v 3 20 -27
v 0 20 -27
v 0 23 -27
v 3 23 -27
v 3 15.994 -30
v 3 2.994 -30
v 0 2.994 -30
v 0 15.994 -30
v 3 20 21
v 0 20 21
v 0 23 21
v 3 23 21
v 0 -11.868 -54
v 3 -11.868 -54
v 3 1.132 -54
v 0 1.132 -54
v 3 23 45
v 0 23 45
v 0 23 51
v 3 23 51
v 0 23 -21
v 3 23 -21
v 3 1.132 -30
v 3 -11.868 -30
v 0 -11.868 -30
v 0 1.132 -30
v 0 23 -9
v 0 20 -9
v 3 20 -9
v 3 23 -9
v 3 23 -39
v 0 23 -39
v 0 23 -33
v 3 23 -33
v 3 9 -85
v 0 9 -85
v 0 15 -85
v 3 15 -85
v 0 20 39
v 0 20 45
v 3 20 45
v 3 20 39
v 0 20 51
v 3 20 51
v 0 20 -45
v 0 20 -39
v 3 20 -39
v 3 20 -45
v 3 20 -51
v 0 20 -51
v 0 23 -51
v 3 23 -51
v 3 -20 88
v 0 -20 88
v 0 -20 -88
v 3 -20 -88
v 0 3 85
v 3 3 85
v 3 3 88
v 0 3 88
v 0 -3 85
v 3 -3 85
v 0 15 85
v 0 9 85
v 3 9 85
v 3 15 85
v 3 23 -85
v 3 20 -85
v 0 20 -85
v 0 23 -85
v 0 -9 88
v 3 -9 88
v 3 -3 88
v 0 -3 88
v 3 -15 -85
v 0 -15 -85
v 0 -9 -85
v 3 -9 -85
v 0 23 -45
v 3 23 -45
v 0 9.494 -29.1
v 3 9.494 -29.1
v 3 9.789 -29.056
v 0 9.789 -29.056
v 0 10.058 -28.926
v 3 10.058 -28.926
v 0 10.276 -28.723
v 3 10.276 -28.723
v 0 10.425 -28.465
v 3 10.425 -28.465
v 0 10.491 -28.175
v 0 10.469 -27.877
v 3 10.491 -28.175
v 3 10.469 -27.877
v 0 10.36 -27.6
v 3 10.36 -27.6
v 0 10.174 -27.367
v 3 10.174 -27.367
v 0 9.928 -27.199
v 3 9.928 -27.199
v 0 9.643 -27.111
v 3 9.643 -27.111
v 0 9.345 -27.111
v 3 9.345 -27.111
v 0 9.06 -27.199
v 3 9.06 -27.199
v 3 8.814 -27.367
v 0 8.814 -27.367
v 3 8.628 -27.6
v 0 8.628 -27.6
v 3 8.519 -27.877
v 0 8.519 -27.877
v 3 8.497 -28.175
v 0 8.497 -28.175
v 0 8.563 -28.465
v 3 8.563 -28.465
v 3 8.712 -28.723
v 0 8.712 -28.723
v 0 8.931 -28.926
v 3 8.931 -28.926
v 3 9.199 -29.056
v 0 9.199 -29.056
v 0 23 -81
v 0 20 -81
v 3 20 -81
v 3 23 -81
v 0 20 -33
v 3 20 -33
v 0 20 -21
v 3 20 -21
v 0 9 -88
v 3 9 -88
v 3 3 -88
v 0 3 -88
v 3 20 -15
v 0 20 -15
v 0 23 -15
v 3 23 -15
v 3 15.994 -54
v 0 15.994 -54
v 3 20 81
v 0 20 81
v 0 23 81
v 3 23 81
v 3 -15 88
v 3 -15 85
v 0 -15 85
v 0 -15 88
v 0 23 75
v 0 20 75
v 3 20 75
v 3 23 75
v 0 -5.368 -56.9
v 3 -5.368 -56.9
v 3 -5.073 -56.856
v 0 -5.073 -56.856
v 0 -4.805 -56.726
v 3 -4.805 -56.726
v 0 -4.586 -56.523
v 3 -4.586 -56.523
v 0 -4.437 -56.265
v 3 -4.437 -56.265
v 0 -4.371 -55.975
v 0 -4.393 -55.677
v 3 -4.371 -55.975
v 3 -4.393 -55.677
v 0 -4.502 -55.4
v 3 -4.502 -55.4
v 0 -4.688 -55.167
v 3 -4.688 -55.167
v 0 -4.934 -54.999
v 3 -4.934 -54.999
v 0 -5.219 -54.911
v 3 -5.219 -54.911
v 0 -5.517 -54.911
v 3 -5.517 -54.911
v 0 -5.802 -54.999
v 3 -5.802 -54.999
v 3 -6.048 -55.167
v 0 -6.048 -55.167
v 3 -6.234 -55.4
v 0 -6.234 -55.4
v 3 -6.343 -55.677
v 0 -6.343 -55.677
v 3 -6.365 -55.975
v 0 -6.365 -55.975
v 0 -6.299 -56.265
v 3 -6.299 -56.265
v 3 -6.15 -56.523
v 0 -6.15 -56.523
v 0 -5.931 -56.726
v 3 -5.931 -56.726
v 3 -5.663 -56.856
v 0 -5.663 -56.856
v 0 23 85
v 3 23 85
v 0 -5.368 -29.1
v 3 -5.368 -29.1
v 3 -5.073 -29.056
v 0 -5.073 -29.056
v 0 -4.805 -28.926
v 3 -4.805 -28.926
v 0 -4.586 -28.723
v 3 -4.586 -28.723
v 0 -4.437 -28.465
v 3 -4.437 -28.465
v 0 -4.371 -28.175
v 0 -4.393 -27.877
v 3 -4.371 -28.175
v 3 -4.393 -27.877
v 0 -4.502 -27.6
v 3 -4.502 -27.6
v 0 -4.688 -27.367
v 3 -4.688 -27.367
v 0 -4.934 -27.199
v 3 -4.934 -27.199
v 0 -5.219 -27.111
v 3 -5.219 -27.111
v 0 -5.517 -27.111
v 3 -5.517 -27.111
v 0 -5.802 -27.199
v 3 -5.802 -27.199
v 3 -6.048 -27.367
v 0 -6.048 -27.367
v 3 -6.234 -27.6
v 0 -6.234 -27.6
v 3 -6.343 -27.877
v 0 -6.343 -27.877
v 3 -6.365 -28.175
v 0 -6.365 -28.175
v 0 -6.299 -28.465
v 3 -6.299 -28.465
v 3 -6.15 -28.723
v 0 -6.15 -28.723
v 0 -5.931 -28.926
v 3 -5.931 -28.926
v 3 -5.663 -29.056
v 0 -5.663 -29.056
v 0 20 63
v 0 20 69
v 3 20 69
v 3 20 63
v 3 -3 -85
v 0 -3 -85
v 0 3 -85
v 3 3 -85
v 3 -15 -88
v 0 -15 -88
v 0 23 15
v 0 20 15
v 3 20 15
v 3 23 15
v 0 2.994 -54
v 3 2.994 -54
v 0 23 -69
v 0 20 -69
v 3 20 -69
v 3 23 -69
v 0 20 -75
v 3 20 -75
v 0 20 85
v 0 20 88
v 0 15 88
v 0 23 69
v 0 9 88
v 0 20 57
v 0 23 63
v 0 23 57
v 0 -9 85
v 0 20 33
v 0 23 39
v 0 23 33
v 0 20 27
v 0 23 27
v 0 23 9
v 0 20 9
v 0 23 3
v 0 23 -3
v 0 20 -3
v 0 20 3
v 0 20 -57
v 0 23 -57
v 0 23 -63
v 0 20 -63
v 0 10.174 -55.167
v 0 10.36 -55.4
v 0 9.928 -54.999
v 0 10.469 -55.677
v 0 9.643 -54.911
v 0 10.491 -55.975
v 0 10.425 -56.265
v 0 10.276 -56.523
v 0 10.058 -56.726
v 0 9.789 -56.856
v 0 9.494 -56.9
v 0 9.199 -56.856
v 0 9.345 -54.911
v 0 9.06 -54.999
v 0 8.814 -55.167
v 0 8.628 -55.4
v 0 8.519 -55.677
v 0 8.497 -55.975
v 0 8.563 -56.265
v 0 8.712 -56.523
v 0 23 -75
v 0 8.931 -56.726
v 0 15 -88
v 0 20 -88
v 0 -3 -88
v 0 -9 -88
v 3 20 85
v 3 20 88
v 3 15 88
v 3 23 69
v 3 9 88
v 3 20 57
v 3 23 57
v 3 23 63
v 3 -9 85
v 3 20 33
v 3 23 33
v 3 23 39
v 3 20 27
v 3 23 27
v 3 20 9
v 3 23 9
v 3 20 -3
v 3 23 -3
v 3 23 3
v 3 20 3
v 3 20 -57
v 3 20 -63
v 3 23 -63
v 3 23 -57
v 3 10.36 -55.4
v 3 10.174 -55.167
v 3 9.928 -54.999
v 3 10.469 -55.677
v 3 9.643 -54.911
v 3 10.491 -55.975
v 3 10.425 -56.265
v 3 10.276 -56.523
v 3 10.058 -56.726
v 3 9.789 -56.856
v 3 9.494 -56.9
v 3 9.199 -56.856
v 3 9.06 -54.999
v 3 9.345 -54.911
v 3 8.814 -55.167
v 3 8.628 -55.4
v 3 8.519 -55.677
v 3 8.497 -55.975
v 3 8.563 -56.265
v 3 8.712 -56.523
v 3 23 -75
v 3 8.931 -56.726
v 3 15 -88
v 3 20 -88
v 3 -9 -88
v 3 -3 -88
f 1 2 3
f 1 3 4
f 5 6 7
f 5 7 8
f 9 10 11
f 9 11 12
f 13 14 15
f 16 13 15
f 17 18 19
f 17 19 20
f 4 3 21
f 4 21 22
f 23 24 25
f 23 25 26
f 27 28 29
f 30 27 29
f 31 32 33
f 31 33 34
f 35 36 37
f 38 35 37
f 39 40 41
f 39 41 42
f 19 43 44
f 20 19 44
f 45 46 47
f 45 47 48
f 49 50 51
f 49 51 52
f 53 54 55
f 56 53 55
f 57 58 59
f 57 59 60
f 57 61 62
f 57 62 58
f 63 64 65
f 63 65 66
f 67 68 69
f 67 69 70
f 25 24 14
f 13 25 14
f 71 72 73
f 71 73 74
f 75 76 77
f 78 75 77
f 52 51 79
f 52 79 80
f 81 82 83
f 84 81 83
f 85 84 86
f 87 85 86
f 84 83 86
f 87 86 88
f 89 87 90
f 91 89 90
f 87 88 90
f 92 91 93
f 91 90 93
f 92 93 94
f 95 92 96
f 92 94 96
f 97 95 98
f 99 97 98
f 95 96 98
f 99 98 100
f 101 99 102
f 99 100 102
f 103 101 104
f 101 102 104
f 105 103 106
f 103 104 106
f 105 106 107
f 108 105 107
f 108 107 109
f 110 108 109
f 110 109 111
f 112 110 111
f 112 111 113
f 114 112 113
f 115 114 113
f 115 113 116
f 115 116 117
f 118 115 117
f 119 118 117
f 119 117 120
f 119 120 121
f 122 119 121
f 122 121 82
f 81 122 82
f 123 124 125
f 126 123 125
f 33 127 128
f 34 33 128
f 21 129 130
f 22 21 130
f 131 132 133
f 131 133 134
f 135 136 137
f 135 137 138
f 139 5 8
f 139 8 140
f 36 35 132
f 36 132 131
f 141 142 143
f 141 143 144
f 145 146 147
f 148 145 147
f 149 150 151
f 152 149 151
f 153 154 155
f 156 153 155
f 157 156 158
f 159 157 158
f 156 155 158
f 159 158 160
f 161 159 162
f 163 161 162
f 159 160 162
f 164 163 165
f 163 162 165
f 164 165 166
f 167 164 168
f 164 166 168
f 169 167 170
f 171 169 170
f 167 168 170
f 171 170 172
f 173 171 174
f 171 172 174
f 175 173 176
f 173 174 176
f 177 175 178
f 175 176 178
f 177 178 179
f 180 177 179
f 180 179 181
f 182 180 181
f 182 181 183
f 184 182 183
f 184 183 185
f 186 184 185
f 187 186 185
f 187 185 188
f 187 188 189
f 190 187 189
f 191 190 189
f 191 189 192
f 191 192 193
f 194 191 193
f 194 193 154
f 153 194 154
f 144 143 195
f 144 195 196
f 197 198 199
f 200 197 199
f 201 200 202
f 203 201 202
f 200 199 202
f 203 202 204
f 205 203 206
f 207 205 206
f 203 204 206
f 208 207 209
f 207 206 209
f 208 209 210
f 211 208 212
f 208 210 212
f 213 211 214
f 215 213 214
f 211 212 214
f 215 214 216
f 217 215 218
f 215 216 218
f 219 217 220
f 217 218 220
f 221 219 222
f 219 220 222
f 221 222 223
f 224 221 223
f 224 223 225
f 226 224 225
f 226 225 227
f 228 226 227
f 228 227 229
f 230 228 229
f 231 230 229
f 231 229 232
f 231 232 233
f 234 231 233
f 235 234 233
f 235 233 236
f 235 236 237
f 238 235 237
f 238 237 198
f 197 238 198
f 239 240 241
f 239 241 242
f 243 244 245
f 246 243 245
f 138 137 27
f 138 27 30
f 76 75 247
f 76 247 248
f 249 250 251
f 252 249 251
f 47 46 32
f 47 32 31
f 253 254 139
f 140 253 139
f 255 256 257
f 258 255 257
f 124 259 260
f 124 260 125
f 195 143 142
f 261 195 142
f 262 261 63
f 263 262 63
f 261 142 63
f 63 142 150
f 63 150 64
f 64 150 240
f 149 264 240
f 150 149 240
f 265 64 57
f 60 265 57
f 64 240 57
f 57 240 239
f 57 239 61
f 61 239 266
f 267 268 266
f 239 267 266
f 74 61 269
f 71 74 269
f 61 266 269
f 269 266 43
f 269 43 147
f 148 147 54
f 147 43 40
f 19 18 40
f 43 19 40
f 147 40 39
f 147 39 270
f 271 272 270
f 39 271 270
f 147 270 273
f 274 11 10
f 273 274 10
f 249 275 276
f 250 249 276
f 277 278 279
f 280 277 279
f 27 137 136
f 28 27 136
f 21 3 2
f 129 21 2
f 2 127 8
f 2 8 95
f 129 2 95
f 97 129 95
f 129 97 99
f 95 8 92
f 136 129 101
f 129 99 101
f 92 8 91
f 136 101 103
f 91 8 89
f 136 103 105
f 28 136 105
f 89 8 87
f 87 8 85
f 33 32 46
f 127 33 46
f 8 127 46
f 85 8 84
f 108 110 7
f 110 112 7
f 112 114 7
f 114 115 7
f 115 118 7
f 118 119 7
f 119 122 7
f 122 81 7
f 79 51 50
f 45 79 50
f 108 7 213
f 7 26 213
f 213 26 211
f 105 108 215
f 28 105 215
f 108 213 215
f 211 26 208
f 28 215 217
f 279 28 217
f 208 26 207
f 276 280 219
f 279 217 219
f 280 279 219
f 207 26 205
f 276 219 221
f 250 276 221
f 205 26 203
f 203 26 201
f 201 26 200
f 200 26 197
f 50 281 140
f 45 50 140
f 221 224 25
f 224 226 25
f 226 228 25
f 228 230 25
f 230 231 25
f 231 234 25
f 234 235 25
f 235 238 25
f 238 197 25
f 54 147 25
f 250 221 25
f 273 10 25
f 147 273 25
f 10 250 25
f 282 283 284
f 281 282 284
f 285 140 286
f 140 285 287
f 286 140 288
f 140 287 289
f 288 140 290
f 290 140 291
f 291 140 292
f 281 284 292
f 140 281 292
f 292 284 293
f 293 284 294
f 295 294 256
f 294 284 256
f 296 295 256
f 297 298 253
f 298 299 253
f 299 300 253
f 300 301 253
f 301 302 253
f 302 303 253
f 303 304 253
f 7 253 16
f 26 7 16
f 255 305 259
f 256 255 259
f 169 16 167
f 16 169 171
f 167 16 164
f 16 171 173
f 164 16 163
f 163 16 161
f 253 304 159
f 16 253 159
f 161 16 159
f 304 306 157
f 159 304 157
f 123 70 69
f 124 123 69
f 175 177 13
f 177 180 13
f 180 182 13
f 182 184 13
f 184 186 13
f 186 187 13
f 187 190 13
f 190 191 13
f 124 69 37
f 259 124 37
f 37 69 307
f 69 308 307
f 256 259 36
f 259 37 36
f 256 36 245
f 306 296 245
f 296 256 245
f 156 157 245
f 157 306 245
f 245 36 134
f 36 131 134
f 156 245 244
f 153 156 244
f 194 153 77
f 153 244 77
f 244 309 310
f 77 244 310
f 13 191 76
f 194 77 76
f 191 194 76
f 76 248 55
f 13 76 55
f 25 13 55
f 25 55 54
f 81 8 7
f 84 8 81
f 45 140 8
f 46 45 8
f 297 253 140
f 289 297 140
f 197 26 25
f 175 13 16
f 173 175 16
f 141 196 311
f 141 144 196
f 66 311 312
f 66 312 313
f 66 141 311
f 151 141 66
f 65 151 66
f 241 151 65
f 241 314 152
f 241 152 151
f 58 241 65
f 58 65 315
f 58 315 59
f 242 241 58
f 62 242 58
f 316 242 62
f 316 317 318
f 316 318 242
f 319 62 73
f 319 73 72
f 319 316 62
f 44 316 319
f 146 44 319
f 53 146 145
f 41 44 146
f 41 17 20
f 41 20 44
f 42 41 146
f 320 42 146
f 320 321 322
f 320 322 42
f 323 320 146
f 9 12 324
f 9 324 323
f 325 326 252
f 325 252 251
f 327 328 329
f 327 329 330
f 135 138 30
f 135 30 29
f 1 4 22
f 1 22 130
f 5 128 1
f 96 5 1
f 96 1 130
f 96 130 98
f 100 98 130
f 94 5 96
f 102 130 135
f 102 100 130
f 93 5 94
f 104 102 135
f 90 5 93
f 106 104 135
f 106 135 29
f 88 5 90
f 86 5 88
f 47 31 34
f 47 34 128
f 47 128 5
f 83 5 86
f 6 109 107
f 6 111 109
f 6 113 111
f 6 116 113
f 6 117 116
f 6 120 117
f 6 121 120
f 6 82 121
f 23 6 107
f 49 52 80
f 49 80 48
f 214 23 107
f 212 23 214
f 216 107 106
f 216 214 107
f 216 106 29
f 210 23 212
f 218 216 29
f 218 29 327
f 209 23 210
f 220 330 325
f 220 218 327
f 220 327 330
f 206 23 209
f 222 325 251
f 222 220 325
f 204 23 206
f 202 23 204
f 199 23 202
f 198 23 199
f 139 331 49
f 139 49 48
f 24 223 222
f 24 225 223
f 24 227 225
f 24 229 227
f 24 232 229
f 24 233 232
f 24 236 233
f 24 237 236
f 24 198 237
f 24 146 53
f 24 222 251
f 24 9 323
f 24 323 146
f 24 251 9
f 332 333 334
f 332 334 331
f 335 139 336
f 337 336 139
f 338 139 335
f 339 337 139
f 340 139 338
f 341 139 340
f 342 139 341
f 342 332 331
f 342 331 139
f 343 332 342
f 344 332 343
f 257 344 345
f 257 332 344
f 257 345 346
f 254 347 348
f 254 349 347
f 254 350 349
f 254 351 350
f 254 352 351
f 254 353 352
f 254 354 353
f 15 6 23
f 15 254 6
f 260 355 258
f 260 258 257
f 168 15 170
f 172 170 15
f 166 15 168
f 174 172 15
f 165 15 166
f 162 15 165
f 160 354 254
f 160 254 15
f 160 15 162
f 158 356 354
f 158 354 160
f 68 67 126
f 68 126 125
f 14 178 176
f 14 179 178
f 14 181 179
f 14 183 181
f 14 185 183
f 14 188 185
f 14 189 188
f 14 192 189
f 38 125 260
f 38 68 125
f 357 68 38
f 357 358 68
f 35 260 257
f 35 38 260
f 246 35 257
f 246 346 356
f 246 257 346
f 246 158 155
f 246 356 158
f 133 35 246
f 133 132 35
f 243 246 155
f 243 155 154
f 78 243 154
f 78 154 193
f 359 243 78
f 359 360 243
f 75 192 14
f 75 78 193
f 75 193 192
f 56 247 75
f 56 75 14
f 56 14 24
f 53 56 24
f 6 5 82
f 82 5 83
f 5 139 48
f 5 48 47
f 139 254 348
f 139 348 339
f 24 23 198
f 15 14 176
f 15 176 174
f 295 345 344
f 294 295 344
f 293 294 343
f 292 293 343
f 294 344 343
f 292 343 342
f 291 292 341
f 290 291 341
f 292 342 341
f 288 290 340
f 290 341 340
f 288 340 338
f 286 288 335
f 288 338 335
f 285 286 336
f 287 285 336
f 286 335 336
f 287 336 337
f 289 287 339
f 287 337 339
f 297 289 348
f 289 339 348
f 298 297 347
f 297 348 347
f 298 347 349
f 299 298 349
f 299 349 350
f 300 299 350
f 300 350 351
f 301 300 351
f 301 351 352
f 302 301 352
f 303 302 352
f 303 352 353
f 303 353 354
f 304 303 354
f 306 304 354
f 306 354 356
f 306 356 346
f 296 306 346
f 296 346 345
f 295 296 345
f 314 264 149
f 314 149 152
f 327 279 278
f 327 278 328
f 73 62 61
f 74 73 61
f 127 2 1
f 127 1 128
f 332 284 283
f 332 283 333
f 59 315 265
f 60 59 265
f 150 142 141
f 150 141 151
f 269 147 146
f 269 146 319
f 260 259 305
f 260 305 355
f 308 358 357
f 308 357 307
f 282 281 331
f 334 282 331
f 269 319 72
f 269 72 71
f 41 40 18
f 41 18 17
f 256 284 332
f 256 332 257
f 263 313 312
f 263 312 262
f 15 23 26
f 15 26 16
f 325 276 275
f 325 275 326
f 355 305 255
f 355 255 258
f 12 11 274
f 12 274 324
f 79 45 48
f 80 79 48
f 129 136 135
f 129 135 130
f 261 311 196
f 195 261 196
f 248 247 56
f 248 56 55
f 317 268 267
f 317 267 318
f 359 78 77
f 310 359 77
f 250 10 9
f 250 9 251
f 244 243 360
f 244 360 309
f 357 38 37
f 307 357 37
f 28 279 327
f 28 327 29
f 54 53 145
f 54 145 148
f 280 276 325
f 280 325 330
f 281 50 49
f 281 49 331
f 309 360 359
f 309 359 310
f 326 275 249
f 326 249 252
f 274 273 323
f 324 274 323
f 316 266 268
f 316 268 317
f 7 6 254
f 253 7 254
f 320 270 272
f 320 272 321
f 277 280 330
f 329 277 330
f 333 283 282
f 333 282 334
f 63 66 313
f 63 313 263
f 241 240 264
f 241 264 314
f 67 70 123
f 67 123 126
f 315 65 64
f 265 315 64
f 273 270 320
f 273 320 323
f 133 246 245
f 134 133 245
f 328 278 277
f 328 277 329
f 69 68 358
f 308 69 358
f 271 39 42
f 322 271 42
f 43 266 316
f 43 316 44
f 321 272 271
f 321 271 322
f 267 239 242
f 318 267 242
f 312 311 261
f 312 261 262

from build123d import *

# Parameters (mm, degrees)
SKETCH1_W               = 170
SKETCH1_H               = 40
BOSS_EXTRUDE1_DEPTH     = 3
SKETCH3_W               = 3
SKETCH3_H               = 6
BOSS_EXTRUDE2_DEPTH     = 3
LPATTERN1_COUNT         = 3
LPATTERN1_PITCH         = 12
LPATTERN1_COL_COUNT     = 2
LPATTERN1_COL_PITCH     = 12
SKETCH4_W               = 3
SKETCH4_H               = 6
BOSS_EXTRUDE3_DEPTH     = 3
LPATTERN2_COUNT         = 8
LPATTERN2_PITCH         = 12
LPATTERN2_COL_COUNT     = 8
LPATTERN2_COL_PITCH     = 12
MIRROR1_COPY_1_SKETCH_W = 3
MIRROR1_COPY_1_SKETCH_H = 6
MIRROR1_COPY_1_DEPTH    = 3
MIRROR1_COPY_2_SKETCH_W = 3
MIRROR1_COPY_2_SKETCH_H = 6
MIRROR1_COPY_2_DEPTH    = 3
MIRROR1_COPY_3_SKETCH_W = 3
MIRROR1_COPY_3_SKETCH_H = 6
MIRROR1_COPY_3_DEPTH    = 3
SKETCH6_R               = 1
SKETCH6_W               = 24
SKETCH6_H               = 13
CUT_EXTRUDE2_DEPTH      = 4
SKETCH7_W               = 3
SKETCH7_H               = 3
CUT_EXTRUDE4_DEPTH      = 4
SKETCH8_W               = 3
SKETCH8_H               = 1
CUT_EXTRUDE5_DEPTH      = 3


with BuildPart() as part:
    # Sketch1 → Boss-Extrude1 (new body)
    with BuildSketch(Plane(origin=(0, 0, 0), x_dir=(0, 0, -1), z_dir=(1, 0, 0))):
        Rectangle(SKETCH1_W, SKETCH1_H)
    extrude(amount=BOSS_EXTRUDE1_DEPTH)

    # Sketch3 → Boss-Extrude2 (add)
    with BuildSketch(Plane(origin=(0, 0, -85), x_dir=(-1, 0, 0), z_dir=(0, 0, -1))):
        with Locations((-1.5, 6)):
            Rectangle(SKETCH3_W, SKETCH3_H)
    boss_extrude2 = extrude(amount=BOSS_EXTRUDE2_DEPTH)

    # LPattern1: Boss-Extrude2 ×3
    with Locations(*[(0, -i * LPATTERN1_PITCH, 0) for i in range(1, LPATTERN1_COUNT)]):
        add(boss_extrude2)

    # LPattern1 col: Boss-Extrude2 ×2
    with Locations(*[(0, i * LPATTERN1_COL_PITCH, 0) for i in range(1, LPATTERN1_COL_COUNT)]):
        add(boss_extrude2)

    # Sketch4 → Boss-Extrude3 (add)
    with BuildSketch(Plane(origin=(0, 20, 0), x_dir=(1, 0, 0), z_dir=(0, 1, 0))):
        with Locations((1.5, 0)):
            Rectangle(SKETCH4_W, SKETCH4_H)
    boss_extrude3 = extrude(amount=BOSS_EXTRUDE3_DEPTH)

    # LPattern2: Boss-Extrude3 ×8
    with Locations(*[(0, 0, -i * LPATTERN2_PITCH) for i in range(1, LPATTERN2_COUNT)]):
        add(boss_extrude3)

    # LPattern2 col: Boss-Extrude3 ×8
    with Locations(*[(0, 0, i * LPATTERN2_COL_PITCH) for i in range(1, LPATTERN2_COL_COUNT)]):
        add(boss_extrude3)

    # Mirror1: Boss-Extrude2 across plane
    add(boss_extrude2.mirror(Plane.XY))

    # Mirror1 copy 1 sketch → Mirror1 copy 1 (add)
    with BuildSketch(Plane(origin=(0, -12, 85), x_dir=(-1, 0, 0), z_dir=(0, 0, 1))):
        with Locations((-1.5, -6)):
            Rectangle(MIRROR1_COPY_1_SKETCH_W, MIRROR1_COPY_1_SKETCH_H)
    extrude(amount=MIRROR1_COPY_1_DEPTH)

    # Mirror1 copy 2 sketch → Mirror1 copy 2 (add)
    with BuildSketch(Plane(origin=(0, -24, 85), x_dir=(-1, 0, 0), z_dir=(0, 0, 1))):
        with Locations((-1.5, -6)):
            Rectangle(MIRROR1_COPY_2_SKETCH_W, MIRROR1_COPY_2_SKETCH_H)
    extrude(amount=MIRROR1_COPY_2_DEPTH)

    # Mirror1 copy 3 sketch → Mirror1 copy 3 (add)
    with BuildSketch(Plane(origin=(0, 12, 85), x_dir=(-1, 0, 0), z_dir=(0, 0, 1))):
        with Locations((-1.5, -6)):
            Rectangle(MIRROR1_COPY_3_SKETCH_W, MIRROR1_COPY_3_SKETCH_H)
    extrude(amount=MIRROR1_COPY_3_DEPTH)

    # Sketch6 → Cut-Extrude2 (cut, through all)
    with BuildSketch(Plane(origin=(3, 0, 0), x_dir=(0, 0, -1), z_dir=(1, 0, 0))):
        with Locations((28.1, -5.368175576)):
            Circle(SKETCH6_R)
        with Locations((55.9, -5.368175576)):
            Circle(SKETCH6_R)
        with Locations((28.1, 9.494198583)):
            Circle(SKETCH6_R)
        with Locations((55.9, 9.494198583)):
            Circle(SKETCH6_R)
        with Locations((42, -5.368175576)):
            Rectangle(SKETCH6_W, SKETCH6_H)
        with Locations((42, 9.494198583)):
            Rectangle(SKETCH6_W, SKETCH6_H)
    extrude(amount=-CUT_EXTRUDE2_DEPTH, mode=Mode.SUBTRACT)

    # Sketch7 → Cut-Extrude4 (cut, through all)
    with BuildSketch(Plane(origin=(3, 0, 0), x_dir=(0, 0, -1), z_dir=(1, 0, 0))):
        with Locations((86.5, 21.5)):
            Rectangle(SKETCH7_W, SKETCH7_H)
    cut_extrude4 = extrude(amount=-CUT_EXTRUDE4_DEPTH, mode=Mode.SUBTRACT)

    # Mirror2: Cut-Extrude4 across plane
    add(cut_extrude4.mirror(Plane.XY), mode=Mode.SUBTRACT)

    # Sketch8 → Cut-Extrude5 (cut)
    with BuildSketch(Plane.ZY):
        with Locations((86.5, -20.5)):
            Rectangle(SKETCH8_W, SKETCH8_H)
    cut_extrude5 = extrude(amount=-CUT_EXTRUDE5_DEPTH, mode=Mode.SUBTRACT)

    # Mirror3: Cut-Extrude5 across plane
    add(cut_extrude5.mirror(Plane.XY), mode=Mode.SUBTRACT)


solid = part.part
